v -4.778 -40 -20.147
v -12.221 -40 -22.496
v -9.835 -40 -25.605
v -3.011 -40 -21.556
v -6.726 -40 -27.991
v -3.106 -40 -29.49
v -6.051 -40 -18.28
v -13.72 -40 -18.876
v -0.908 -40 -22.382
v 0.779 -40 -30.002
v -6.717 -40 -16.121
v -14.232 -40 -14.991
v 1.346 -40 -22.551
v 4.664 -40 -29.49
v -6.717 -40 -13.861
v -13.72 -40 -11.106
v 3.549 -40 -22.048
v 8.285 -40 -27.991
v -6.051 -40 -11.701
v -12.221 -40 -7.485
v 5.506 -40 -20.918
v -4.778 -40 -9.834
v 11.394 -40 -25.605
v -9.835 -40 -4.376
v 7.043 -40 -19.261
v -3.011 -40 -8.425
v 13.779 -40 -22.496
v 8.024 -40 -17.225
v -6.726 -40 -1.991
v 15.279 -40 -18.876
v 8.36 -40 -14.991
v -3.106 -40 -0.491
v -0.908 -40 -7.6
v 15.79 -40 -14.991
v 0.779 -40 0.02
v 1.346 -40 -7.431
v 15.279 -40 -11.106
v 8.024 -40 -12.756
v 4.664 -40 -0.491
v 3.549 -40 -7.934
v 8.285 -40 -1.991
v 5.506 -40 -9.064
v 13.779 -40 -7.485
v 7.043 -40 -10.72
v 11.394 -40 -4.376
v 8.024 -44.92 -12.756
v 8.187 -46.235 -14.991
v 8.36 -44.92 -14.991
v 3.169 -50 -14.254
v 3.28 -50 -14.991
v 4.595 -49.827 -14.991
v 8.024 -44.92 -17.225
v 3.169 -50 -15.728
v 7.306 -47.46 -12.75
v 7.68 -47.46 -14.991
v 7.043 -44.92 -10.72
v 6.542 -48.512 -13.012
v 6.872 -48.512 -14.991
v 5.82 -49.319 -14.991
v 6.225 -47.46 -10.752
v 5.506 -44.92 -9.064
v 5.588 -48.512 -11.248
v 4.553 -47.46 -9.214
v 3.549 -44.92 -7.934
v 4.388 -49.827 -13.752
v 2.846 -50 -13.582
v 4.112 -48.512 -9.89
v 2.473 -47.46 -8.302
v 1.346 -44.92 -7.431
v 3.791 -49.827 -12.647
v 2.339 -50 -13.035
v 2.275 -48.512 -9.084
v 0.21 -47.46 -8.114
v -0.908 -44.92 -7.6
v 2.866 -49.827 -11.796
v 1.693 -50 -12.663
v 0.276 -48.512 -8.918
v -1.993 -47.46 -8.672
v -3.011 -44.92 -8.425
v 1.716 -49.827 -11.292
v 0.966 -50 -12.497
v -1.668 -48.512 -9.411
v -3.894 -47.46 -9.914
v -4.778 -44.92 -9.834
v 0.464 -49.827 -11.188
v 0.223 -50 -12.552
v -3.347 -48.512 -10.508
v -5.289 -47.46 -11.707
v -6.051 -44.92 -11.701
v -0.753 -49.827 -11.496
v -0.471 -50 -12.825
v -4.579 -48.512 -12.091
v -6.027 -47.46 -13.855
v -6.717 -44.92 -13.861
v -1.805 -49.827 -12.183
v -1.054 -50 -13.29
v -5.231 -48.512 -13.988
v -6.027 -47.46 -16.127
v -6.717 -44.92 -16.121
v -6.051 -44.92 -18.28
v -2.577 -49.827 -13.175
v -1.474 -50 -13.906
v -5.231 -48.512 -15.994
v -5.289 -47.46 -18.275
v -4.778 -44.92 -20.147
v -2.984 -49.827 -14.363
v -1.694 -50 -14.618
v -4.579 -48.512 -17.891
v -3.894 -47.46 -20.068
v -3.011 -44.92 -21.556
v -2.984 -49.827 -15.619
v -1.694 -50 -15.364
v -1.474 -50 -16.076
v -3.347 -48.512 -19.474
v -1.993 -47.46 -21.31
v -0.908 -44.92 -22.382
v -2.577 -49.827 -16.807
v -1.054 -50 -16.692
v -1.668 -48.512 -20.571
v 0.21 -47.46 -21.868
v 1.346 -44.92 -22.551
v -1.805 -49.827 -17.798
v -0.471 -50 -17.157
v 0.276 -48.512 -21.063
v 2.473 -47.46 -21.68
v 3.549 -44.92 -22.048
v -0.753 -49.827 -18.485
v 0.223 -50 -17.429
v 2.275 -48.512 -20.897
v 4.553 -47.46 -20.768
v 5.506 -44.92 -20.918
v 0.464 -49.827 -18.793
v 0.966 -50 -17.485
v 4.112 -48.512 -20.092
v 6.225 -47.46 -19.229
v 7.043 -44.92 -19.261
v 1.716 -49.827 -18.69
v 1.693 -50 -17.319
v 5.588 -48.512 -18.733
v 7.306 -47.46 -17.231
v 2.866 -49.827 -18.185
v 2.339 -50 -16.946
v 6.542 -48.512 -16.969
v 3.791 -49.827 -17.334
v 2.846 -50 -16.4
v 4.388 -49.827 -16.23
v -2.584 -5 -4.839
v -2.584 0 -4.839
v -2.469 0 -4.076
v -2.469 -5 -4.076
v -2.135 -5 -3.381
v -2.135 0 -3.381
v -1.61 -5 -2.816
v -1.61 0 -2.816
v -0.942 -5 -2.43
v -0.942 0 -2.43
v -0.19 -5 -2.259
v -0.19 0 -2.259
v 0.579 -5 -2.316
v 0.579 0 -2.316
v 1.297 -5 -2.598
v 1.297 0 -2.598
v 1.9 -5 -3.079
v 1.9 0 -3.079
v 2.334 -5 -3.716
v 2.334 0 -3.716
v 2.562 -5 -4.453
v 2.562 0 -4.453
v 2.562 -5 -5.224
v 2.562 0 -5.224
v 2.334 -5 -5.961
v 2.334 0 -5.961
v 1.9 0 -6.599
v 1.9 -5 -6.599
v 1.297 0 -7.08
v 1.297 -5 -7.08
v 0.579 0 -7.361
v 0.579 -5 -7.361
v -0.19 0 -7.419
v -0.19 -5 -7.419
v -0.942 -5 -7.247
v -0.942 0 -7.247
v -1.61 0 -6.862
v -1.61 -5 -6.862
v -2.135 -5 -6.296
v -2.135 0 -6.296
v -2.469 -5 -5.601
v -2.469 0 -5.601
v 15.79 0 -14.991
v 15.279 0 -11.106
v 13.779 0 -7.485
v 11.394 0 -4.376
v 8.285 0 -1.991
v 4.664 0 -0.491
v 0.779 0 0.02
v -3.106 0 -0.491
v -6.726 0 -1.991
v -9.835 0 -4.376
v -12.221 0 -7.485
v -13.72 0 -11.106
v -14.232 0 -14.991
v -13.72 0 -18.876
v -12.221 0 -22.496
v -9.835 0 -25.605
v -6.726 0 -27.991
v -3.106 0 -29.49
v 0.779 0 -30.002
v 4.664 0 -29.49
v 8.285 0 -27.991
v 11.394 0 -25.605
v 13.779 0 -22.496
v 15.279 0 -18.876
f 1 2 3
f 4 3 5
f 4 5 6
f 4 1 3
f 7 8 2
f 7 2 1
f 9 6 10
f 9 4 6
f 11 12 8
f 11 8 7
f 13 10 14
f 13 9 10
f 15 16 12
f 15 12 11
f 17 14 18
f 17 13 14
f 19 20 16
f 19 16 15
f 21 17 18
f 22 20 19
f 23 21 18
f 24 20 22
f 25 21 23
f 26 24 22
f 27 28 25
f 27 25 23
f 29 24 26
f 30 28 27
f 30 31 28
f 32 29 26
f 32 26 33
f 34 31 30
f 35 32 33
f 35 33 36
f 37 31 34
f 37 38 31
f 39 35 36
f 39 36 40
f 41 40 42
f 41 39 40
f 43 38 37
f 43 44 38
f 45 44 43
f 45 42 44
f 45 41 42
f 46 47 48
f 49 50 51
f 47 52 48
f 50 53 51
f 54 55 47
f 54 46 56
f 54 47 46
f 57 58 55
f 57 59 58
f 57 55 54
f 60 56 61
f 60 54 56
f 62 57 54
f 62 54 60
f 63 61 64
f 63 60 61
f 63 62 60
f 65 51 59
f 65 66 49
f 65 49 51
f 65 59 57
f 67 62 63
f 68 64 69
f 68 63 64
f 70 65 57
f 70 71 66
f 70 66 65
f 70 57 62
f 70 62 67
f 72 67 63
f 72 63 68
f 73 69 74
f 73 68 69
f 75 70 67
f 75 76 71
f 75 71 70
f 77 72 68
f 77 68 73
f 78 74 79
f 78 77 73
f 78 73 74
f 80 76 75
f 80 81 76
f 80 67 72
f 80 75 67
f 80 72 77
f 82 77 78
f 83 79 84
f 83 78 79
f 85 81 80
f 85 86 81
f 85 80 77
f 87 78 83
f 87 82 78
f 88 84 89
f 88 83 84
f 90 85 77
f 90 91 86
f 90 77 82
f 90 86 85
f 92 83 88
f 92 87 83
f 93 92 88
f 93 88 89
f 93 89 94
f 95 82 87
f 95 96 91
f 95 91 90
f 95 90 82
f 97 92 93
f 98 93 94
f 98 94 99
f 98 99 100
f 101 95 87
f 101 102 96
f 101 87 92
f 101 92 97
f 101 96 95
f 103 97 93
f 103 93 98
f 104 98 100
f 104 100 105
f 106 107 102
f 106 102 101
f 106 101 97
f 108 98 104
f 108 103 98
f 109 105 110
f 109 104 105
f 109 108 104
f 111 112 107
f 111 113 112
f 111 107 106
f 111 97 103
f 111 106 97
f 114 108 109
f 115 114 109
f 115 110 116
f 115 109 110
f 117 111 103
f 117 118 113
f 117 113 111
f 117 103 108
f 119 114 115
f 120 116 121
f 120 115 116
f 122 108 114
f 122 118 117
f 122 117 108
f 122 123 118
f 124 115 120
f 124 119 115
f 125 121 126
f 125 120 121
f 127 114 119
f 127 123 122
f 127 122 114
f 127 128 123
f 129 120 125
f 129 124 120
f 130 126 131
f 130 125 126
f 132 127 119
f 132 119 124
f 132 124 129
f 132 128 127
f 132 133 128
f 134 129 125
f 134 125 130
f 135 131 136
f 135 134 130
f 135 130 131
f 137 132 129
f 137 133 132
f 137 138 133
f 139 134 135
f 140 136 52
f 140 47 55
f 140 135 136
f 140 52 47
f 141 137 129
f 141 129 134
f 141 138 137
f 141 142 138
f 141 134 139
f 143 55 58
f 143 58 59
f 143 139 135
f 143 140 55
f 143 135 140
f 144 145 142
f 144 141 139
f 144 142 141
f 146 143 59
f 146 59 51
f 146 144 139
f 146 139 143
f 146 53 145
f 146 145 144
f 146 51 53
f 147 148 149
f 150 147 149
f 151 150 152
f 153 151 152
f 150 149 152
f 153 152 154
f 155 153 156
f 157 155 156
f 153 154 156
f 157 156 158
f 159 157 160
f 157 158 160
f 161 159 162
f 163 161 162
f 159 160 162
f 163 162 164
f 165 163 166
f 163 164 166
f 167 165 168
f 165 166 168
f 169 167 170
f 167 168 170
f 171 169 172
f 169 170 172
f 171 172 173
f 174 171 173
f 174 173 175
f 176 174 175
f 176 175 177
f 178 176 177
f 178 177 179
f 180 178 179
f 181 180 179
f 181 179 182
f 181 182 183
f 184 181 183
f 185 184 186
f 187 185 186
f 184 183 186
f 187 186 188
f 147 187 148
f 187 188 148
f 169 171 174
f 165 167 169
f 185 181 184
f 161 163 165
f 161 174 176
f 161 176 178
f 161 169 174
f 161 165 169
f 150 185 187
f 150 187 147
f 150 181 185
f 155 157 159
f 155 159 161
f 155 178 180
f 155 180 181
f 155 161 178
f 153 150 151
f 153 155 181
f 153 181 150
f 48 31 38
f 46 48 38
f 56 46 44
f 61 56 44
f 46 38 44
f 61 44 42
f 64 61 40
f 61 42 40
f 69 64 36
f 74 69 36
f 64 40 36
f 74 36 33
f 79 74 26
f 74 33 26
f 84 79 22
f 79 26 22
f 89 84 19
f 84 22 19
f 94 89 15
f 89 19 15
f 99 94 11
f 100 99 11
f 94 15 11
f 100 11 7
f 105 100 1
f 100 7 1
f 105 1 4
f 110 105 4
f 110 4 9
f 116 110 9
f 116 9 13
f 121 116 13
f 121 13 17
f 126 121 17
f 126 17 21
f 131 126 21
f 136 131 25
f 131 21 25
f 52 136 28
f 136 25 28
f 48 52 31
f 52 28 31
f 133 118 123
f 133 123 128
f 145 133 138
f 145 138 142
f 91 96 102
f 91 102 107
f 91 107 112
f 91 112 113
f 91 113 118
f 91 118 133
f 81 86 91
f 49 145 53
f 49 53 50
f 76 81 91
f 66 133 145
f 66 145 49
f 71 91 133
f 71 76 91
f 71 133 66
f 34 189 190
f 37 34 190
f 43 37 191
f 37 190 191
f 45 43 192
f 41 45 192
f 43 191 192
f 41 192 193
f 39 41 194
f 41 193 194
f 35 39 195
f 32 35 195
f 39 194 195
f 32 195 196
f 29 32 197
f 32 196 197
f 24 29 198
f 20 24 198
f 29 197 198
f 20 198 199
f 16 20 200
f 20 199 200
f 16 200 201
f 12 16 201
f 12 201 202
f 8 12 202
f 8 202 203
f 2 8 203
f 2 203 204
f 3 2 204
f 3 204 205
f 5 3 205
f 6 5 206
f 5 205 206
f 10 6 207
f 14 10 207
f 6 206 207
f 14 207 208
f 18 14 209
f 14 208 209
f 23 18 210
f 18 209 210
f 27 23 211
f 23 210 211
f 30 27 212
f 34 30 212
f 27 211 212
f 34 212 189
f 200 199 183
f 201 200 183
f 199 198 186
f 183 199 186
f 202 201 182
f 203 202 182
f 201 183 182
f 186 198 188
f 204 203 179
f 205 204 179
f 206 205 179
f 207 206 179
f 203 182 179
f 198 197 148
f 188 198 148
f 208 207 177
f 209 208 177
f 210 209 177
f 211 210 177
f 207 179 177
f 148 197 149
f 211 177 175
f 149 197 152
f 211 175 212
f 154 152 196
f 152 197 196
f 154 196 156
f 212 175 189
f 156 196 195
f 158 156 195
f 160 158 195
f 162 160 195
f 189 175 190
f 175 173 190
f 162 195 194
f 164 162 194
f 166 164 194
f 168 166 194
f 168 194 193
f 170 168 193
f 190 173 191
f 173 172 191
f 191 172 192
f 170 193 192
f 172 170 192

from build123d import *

# Parameters (mm, degrees)
F0_R     = 15.010998
F1_DEPTH = 40
F2_R     = 2.587431
F3_DEPTH = 5
F4_R     = 7.580978
F5_DEPTH = 10
F6_R     = 5.08


with BuildPart() as f1:
    # F0 (on Front) → F1 (new body)
    with BuildSketch(Plane.XZ):
        with Locations((0.77934, -14.990753)):
            Circle(F0_R)
    extrude(amount=F1_DEPTH)

    # F2 (on face) → F3 (cut)
    with BuildSketch(Plane(origin=(0, 0, 0), x_dir=(-1, 0, 0), z_dir=(0, 1, 0))):
        with Locations((-0.003086, -4.838753)):
            Circle(F2_R)
    extrude(amount=-F3_DEPTH, mode=Mode.SUBTRACT)

    # F4 (on face) → F5 (join)
    with BuildSketch(Plane.XZ.offset(40)):
        with Locations((0.77934, -14.990753)):
            Circle(F4_R)
    extrude(amount=F5_DEPTH)

    # F6
    f6_edges = [f1.edges().sort_by_distance(p)[0] for p in [
        (-6.801638, -50, -14.990753),
    ]]
    fillet(f6_edges, radius=F6_R)


solid = f1.part
